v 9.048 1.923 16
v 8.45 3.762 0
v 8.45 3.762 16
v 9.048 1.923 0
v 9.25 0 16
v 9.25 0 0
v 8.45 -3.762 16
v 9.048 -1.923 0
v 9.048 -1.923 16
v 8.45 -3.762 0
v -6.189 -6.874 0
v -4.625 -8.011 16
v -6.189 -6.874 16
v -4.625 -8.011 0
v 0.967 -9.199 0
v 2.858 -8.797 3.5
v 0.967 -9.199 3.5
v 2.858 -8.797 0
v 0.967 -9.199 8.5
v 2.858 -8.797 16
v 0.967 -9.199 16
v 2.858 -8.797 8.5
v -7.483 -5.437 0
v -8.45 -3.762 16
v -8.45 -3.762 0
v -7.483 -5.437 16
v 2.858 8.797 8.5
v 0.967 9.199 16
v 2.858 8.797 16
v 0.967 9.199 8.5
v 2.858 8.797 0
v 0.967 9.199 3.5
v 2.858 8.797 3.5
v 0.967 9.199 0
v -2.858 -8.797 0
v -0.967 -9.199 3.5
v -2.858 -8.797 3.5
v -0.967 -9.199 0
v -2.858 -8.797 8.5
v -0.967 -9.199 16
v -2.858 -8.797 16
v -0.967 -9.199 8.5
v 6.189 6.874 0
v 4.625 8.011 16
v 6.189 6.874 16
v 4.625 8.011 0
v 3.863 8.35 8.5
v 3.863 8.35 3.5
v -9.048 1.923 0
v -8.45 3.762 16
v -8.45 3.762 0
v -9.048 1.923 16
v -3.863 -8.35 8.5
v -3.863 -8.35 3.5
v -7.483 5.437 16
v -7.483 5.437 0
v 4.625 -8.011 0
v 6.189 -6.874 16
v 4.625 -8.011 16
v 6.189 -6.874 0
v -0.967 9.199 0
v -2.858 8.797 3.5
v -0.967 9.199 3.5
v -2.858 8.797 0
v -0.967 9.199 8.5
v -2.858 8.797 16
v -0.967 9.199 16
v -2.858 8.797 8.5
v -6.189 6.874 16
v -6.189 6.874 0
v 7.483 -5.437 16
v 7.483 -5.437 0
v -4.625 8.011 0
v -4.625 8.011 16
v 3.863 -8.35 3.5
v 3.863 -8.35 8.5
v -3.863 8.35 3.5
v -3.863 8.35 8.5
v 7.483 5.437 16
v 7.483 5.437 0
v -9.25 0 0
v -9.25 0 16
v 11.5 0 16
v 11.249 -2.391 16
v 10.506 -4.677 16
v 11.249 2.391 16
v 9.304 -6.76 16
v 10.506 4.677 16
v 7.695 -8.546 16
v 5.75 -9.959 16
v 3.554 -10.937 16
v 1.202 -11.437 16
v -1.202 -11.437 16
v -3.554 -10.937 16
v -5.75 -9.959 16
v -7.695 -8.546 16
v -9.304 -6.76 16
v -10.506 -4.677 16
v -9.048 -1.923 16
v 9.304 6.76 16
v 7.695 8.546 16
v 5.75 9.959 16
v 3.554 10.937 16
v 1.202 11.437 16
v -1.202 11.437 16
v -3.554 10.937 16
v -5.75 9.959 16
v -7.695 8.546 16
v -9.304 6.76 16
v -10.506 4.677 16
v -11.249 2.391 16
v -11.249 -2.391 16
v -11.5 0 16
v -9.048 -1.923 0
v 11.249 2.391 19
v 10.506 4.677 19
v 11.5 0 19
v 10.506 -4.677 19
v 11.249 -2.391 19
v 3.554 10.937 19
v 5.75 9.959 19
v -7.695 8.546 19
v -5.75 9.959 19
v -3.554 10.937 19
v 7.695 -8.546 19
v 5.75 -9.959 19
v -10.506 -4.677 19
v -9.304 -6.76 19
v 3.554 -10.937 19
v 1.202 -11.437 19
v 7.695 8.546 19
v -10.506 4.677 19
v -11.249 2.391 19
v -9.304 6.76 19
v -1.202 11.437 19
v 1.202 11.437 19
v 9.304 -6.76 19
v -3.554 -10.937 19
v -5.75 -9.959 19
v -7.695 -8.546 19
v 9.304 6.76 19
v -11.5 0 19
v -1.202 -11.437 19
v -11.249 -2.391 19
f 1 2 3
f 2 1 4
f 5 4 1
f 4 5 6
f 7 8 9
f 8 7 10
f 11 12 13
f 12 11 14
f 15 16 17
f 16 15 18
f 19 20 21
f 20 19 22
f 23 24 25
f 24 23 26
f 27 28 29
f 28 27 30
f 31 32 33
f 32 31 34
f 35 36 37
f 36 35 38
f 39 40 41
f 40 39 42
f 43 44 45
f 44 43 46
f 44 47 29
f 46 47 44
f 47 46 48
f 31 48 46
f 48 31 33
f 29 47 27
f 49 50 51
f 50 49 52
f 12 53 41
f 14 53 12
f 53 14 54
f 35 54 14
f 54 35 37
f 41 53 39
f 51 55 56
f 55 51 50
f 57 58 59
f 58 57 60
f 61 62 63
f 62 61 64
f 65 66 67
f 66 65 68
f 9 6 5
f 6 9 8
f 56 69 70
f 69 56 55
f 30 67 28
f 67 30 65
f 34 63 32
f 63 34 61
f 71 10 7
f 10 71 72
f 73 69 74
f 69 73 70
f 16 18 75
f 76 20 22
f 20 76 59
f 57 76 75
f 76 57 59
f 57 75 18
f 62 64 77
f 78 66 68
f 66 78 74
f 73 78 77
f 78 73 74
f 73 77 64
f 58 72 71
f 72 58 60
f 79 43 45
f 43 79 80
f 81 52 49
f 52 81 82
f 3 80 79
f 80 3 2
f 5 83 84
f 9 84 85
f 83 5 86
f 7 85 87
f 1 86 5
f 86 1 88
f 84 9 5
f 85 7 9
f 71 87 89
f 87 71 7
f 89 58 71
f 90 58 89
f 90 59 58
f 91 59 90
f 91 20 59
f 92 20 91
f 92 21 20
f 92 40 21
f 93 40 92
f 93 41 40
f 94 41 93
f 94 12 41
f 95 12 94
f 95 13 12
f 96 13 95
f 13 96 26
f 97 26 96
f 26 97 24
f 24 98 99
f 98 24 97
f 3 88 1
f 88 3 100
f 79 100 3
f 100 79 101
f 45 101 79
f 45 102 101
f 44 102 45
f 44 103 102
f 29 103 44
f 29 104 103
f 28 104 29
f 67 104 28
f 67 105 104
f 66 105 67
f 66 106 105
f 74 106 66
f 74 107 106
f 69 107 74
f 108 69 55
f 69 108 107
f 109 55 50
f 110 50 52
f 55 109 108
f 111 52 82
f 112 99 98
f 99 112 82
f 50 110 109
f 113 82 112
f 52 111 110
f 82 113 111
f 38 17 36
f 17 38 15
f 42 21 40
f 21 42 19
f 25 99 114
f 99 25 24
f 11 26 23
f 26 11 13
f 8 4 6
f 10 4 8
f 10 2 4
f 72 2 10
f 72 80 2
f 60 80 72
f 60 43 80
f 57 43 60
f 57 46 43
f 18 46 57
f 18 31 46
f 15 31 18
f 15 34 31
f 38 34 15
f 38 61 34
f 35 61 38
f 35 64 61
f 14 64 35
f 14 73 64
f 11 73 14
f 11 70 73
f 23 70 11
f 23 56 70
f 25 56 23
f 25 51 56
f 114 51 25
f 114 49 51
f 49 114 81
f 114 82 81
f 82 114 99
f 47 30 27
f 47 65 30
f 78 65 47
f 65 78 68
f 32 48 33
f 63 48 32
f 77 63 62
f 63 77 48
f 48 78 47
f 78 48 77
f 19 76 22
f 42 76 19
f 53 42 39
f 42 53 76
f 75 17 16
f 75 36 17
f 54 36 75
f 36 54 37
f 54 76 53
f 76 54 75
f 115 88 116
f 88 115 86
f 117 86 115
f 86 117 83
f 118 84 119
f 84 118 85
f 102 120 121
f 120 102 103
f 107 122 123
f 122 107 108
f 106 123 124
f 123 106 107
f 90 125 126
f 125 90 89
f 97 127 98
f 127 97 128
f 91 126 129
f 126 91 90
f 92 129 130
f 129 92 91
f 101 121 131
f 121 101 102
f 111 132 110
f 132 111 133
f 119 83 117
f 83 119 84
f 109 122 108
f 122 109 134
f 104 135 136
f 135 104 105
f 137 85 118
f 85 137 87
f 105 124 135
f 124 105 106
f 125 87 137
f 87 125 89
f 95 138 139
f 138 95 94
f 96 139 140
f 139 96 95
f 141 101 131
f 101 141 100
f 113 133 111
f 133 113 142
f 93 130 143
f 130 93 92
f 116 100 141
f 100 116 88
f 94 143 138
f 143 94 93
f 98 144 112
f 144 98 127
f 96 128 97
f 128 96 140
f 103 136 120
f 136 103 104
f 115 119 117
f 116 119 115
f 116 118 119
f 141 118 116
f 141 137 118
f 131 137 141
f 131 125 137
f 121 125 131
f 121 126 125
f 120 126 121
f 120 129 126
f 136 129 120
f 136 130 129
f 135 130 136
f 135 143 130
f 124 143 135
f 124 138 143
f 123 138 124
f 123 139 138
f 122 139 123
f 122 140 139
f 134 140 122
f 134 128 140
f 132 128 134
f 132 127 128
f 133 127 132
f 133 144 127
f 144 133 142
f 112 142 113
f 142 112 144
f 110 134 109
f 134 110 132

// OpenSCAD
// measurements

module switch() {

    mid_diameter = 18.5;
    cap_diameter = 23;
    cap_height = 3;
    mid_height = 16;
    doohickey_thickness = 1;
    doohickey_widest = 23;
    mid_divot_diameter = 16.7;
    bottom_to_divot_top = 8.5;

    difference() {
        cylinder(h=mid_height, r=mid_diameter/2);

        translate([0, mid_divot_diameter/2+5,bottom_to_divot_top-2.5])
        cube([10,10,5], center=true);

        translate([0, -mid_divot_diameter/2-5,bottom_to_divot_top-2.5])
        cube([10,10,5], center=true);
    }



    translate([0,0,mid_height])
    cylinder(h=cap_height, r=cap_diameter/2);
}

switch();
